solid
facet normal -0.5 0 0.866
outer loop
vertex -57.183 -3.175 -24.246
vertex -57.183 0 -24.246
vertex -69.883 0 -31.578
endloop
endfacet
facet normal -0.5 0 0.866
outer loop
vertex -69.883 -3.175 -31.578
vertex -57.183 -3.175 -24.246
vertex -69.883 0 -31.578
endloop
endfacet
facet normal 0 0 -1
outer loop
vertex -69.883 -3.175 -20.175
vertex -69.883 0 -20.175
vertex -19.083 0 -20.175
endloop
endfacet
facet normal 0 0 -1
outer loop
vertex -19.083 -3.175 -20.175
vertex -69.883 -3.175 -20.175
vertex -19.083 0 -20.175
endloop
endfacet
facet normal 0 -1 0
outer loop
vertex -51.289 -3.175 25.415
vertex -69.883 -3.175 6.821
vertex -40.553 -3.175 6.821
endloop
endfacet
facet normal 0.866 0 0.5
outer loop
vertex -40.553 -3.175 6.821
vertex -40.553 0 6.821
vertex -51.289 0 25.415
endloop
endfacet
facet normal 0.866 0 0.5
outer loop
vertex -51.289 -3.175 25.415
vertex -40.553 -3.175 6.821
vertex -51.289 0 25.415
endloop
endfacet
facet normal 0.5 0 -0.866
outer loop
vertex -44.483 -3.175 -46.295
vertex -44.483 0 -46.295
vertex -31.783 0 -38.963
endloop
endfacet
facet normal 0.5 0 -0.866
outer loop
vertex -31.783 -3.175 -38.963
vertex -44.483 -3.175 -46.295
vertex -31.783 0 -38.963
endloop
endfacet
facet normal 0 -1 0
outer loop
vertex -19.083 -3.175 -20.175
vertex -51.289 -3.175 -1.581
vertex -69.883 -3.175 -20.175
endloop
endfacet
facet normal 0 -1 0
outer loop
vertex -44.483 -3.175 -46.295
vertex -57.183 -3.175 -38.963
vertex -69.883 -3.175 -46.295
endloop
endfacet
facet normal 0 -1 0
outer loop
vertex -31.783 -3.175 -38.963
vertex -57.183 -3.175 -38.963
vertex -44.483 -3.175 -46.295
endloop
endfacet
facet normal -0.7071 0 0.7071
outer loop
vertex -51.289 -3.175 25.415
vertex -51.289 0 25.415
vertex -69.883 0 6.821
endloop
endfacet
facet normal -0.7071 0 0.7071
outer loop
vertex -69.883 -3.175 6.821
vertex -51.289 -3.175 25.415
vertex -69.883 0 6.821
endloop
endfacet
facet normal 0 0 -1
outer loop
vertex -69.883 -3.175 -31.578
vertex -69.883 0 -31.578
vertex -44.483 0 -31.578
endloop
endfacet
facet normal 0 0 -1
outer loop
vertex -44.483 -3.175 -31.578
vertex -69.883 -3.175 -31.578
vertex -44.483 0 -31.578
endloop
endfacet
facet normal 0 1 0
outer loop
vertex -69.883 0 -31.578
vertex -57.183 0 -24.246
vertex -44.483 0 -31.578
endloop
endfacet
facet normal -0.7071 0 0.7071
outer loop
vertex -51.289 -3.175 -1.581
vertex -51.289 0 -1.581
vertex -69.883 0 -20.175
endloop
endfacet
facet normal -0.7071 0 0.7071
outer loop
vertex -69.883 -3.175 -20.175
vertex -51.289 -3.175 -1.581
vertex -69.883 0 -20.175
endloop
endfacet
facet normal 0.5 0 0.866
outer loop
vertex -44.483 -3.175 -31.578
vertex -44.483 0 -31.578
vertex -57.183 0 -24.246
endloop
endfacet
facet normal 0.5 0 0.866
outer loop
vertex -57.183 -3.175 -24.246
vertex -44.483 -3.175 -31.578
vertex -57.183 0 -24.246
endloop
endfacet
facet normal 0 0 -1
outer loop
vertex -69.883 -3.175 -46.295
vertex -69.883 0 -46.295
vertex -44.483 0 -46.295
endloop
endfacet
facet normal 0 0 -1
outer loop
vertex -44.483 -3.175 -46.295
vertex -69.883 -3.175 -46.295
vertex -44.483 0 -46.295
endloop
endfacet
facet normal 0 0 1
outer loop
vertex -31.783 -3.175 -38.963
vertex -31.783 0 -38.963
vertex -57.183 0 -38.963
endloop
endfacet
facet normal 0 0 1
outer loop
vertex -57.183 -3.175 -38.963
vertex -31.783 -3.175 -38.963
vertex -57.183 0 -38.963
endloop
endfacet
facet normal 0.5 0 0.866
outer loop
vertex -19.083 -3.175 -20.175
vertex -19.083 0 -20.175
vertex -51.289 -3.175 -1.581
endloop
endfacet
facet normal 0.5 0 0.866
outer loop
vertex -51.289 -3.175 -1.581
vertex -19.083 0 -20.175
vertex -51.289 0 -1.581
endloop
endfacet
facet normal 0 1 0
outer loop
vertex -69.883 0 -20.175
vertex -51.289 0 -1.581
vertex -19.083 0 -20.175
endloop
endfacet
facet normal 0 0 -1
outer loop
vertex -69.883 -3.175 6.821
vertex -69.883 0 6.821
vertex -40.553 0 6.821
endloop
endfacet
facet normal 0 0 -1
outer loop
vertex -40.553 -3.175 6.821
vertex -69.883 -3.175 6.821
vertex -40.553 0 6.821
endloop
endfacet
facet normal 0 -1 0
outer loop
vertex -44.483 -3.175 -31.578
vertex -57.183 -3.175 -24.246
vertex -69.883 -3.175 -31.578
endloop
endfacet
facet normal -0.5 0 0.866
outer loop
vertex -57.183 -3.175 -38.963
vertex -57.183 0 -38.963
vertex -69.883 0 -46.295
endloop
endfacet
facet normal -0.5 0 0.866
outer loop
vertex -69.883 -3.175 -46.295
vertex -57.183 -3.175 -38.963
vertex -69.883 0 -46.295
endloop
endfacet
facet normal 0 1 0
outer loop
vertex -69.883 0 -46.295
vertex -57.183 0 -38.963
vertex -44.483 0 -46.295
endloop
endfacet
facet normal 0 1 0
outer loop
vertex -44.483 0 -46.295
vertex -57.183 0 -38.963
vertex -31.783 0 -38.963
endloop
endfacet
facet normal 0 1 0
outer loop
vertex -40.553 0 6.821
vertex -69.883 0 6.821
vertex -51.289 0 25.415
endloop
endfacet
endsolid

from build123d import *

# Parameters (mm, degrees)
F1_DEPTH = 3.175
F2_DEPTH = 3.175
F3_DEPTH = 3.175
F4_DEPTH = 3.175


with BuildPart() as f1:
    # F0 (on Front) → F1 (new body)
    with BuildSketch(Plane.XZ):
        Polygon((-51.288526, -1.580715), (-69.882616, -20.174805), (-19.082616, -20.174805), align=None)
    extrude(amount=F1_DEPTH)


with BuildPart() as f2:
    # F0 (on Front) → F2 (new body)
    with BuildSketch(Plane.XZ):
        Polygon((-57.182616, -24.245898), (-69.882616, -31.578247), (-44.482616, -31.578247), align=None)
    extrude(amount=F2_DEPTH)


with BuildPart() as f3:
    # F0 (on Front) → F3 (new body)
    with BuildSketch(Plane.XZ):
        Polygon((-57.182616, -38.963026), (-69.882616, -46.295375), (-44.482616, -46.295375), (-31.782616, -38.963026), align=None)
    extrude(amount=F3_DEPTH)


with BuildPart() as f4:
    # F0 (on Front) → F4 (new body)
    with BuildSketch(Plane.XZ):
        Polygon((-51.288526, 25.414865), (-69.882616, 6.820775), (-40.553223, 6.820775), align=None)
    extrude(amount=F4_DEPTH)


solid = Compound([f1.part, f2.part, f3.part, f4.part])
